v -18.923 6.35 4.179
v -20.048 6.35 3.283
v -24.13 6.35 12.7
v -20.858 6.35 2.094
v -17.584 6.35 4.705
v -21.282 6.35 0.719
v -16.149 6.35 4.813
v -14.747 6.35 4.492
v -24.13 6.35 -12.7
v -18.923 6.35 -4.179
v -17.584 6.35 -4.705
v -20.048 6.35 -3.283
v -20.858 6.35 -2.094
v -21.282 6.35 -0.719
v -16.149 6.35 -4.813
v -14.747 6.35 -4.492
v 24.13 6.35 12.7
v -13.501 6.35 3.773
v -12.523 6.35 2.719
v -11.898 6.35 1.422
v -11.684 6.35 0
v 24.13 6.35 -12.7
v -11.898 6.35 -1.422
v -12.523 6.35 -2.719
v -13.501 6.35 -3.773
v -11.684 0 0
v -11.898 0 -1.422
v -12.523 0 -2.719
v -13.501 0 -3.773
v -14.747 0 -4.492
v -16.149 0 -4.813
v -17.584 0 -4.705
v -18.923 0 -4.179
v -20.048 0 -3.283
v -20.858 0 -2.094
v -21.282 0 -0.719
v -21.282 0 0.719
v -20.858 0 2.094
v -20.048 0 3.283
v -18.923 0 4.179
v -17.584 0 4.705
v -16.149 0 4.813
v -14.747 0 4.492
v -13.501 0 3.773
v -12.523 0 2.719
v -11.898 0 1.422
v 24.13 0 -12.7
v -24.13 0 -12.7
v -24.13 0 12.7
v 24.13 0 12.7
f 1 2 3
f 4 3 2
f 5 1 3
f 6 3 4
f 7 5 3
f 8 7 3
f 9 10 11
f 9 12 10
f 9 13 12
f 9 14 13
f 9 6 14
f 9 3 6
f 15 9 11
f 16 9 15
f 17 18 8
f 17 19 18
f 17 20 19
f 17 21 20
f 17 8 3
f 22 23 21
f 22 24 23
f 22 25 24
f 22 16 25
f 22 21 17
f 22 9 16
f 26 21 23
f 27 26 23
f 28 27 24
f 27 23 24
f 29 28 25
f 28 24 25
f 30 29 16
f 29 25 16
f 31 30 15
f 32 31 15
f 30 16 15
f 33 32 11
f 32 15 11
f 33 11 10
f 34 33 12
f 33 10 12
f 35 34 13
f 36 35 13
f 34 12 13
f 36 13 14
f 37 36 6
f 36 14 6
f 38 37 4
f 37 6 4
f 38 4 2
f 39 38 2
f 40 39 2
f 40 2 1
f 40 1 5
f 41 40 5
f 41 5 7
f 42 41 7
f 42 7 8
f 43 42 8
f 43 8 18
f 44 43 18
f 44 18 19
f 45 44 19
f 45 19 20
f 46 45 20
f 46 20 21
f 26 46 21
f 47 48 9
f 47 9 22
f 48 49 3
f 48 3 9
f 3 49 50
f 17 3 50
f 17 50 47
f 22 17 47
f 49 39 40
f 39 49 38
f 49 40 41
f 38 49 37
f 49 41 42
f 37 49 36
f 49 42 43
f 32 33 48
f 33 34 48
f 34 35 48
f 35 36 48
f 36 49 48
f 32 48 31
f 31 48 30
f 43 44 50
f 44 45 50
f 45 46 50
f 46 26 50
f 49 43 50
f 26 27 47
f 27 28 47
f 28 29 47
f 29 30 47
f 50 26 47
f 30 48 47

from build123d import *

# Parameters (mm, degrees)
SKETCH1_W           = 48.26
SKETCH1_H           = 25.4
BOSS_EXTRUDE1_DEPTH = 6.35
SKETCH2_R           = 4.826
CUT_EXTRUDE1_DEPTH  = 8.89


with BuildPart() as part:
    # Sketch1 → Boss-Extrude1 (new body)
    with BuildSketch(Plane(origin=(0, 0, 0), x_dir=(1, 0, 0), z_dir=(0, 1, 0))):
        Rectangle(SKETCH1_W, SKETCH1_H)
    extrude(amount=BOSS_EXTRUDE1_DEPTH)

    # Sketch2 → Cut-Extrude1 (cut)
    with BuildSketch(Plane(origin=(0, 6.35, 0), x_dir=(1, 0, 0), z_dir=(0, 1, 0))):
        with Locations((-16.51, 0)):
            Circle(SKETCH2_R)
    extrude(amount=-CUT_EXTRUDE1_DEPTH, mode=Mode.SUBTRACT)


solid = part.part
